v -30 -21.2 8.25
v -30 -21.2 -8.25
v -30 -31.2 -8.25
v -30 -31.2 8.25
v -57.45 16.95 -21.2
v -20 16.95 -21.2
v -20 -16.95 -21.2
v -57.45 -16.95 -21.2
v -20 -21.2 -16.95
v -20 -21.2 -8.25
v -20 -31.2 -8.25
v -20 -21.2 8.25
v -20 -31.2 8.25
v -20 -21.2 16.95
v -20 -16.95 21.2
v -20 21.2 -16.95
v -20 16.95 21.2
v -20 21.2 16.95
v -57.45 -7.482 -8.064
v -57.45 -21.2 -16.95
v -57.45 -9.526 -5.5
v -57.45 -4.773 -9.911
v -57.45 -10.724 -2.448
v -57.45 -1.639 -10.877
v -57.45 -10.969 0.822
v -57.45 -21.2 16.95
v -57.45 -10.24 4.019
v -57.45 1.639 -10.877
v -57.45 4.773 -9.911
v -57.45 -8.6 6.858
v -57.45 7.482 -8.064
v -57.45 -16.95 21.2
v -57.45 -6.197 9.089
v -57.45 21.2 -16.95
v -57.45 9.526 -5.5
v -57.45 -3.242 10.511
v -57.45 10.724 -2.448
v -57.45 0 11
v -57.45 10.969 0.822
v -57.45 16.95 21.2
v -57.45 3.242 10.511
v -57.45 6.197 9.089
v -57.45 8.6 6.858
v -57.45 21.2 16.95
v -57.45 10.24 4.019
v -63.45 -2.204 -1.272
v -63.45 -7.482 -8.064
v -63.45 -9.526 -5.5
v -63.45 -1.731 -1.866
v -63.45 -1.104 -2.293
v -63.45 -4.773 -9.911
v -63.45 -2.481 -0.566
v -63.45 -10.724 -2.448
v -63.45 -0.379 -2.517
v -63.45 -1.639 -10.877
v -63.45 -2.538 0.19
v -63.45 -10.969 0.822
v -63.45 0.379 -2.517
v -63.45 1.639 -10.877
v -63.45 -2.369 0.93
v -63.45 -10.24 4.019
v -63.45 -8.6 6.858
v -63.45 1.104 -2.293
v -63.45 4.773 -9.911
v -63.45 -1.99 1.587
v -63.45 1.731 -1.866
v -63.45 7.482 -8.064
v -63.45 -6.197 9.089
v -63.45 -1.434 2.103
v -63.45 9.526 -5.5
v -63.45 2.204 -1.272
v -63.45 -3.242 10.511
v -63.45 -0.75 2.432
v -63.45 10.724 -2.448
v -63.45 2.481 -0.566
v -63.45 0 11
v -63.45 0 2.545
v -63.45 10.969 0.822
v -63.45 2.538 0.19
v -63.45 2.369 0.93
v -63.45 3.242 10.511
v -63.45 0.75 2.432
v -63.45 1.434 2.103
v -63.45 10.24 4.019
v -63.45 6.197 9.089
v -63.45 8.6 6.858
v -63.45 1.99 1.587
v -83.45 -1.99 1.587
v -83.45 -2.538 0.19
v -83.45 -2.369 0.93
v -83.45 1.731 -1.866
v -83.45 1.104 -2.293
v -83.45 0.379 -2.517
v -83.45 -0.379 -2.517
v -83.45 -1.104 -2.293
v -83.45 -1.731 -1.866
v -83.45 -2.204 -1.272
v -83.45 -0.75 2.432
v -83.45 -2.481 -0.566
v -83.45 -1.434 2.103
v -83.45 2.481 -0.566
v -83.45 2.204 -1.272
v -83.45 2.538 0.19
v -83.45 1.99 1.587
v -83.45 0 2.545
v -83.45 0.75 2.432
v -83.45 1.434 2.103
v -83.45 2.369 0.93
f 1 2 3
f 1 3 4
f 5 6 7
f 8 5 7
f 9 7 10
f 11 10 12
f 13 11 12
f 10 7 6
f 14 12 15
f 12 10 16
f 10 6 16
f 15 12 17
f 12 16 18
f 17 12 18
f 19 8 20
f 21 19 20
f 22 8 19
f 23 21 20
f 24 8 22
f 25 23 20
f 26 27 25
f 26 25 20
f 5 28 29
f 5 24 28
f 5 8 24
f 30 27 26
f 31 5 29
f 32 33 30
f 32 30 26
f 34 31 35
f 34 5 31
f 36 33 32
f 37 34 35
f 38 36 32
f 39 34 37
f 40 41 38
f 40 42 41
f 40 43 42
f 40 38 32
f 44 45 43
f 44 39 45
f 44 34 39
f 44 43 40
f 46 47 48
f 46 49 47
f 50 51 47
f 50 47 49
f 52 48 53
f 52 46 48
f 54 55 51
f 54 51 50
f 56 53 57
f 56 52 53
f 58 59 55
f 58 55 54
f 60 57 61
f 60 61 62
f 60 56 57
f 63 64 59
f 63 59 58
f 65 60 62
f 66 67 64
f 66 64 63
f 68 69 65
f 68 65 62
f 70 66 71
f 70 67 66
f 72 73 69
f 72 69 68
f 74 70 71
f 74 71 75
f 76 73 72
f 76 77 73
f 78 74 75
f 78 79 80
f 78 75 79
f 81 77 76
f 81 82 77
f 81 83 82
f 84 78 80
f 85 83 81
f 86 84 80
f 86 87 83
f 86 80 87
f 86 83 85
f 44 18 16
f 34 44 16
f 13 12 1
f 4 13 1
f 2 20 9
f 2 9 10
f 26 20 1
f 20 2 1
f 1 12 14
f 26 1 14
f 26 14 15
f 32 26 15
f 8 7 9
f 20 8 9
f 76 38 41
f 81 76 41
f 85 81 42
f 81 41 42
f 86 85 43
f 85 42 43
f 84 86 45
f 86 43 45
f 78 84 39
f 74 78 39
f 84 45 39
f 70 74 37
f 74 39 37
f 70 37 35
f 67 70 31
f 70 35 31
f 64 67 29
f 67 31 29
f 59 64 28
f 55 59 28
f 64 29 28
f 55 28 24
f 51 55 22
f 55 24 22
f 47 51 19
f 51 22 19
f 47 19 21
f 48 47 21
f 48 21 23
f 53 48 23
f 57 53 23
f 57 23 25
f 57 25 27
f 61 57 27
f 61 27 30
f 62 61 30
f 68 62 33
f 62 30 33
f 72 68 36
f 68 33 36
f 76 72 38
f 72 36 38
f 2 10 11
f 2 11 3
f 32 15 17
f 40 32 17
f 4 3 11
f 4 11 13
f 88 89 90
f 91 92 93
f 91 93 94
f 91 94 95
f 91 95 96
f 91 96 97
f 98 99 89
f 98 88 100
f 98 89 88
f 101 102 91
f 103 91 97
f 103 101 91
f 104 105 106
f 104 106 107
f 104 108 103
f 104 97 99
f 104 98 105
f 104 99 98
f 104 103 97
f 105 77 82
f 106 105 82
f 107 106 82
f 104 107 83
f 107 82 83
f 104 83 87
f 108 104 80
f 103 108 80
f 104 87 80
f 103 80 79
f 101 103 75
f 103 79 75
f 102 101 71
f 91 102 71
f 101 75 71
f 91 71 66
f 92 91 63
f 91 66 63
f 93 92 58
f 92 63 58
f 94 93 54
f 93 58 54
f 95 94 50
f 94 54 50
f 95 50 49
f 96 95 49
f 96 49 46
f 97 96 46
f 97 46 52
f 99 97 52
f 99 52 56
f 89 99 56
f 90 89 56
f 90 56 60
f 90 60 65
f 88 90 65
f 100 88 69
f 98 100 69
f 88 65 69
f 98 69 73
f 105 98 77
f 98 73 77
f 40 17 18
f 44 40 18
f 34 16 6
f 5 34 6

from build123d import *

# Parameters (mm, degrees)
PAD_DEPTH            = 37.45
SKETCH001_W          = 16.5
SKETCH001_H          = 10
PAD001_DEPTH         = 10
SKETCH002_R          = 11
PAD002_DEPTH         = 6
SKETCH003_R          = 2.545
PAD003_DEPTH         = 20
BODY_PLACEMENT_ANGLE = 90


with BuildPart() as part:
    # Sketch → Pad (new body)
    with BuildSketch(Plane.XY):
        Polygon((-21.2, 16.95), (-21.2, -16.95), (-16.95, -21.2), (16.95, -21.2), (21.2, -16.95), (21.2, 16.95), (16.95, 21.2), (-16.95, 21.2), align=None)
    extrude(amount=PAD_DEPTH)

    # Sketch001 (on Face3 of Pad) → Pad001 (join)
    with BuildSketch(Plane.XZ.offset(21.2)):
        with Locations((0, 5)):
            Rectangle(SKETCH001_W, SKETCH001_H)
    extrude(amount=PAD001_DEPTH)

    # Sketch002 (on Face5 of Pad001) → Pad002 (join)
    with BuildSketch(Plane.XY.offset(37.45)):
        Circle(SKETCH002_R)
    extrude(amount=PAD002_DEPTH)

    # Sketch003 (on Face17 of Pad002) → Pad003 (join)
    with BuildSketch(Plane.XY.offset(43.45)):
        Circle(SKETCH003_R)
    extrude(amount=PAD003_DEPTH)


with BuildPart() as part_1:
    # Body placement: moved
    add(part.part.moved(Location((-20, 0, 0))).rotate(Axis((-20, 0, 0), (0, -1, 0)), BODY_PLACEMENT_ANGLE))


solid = part_1.part
